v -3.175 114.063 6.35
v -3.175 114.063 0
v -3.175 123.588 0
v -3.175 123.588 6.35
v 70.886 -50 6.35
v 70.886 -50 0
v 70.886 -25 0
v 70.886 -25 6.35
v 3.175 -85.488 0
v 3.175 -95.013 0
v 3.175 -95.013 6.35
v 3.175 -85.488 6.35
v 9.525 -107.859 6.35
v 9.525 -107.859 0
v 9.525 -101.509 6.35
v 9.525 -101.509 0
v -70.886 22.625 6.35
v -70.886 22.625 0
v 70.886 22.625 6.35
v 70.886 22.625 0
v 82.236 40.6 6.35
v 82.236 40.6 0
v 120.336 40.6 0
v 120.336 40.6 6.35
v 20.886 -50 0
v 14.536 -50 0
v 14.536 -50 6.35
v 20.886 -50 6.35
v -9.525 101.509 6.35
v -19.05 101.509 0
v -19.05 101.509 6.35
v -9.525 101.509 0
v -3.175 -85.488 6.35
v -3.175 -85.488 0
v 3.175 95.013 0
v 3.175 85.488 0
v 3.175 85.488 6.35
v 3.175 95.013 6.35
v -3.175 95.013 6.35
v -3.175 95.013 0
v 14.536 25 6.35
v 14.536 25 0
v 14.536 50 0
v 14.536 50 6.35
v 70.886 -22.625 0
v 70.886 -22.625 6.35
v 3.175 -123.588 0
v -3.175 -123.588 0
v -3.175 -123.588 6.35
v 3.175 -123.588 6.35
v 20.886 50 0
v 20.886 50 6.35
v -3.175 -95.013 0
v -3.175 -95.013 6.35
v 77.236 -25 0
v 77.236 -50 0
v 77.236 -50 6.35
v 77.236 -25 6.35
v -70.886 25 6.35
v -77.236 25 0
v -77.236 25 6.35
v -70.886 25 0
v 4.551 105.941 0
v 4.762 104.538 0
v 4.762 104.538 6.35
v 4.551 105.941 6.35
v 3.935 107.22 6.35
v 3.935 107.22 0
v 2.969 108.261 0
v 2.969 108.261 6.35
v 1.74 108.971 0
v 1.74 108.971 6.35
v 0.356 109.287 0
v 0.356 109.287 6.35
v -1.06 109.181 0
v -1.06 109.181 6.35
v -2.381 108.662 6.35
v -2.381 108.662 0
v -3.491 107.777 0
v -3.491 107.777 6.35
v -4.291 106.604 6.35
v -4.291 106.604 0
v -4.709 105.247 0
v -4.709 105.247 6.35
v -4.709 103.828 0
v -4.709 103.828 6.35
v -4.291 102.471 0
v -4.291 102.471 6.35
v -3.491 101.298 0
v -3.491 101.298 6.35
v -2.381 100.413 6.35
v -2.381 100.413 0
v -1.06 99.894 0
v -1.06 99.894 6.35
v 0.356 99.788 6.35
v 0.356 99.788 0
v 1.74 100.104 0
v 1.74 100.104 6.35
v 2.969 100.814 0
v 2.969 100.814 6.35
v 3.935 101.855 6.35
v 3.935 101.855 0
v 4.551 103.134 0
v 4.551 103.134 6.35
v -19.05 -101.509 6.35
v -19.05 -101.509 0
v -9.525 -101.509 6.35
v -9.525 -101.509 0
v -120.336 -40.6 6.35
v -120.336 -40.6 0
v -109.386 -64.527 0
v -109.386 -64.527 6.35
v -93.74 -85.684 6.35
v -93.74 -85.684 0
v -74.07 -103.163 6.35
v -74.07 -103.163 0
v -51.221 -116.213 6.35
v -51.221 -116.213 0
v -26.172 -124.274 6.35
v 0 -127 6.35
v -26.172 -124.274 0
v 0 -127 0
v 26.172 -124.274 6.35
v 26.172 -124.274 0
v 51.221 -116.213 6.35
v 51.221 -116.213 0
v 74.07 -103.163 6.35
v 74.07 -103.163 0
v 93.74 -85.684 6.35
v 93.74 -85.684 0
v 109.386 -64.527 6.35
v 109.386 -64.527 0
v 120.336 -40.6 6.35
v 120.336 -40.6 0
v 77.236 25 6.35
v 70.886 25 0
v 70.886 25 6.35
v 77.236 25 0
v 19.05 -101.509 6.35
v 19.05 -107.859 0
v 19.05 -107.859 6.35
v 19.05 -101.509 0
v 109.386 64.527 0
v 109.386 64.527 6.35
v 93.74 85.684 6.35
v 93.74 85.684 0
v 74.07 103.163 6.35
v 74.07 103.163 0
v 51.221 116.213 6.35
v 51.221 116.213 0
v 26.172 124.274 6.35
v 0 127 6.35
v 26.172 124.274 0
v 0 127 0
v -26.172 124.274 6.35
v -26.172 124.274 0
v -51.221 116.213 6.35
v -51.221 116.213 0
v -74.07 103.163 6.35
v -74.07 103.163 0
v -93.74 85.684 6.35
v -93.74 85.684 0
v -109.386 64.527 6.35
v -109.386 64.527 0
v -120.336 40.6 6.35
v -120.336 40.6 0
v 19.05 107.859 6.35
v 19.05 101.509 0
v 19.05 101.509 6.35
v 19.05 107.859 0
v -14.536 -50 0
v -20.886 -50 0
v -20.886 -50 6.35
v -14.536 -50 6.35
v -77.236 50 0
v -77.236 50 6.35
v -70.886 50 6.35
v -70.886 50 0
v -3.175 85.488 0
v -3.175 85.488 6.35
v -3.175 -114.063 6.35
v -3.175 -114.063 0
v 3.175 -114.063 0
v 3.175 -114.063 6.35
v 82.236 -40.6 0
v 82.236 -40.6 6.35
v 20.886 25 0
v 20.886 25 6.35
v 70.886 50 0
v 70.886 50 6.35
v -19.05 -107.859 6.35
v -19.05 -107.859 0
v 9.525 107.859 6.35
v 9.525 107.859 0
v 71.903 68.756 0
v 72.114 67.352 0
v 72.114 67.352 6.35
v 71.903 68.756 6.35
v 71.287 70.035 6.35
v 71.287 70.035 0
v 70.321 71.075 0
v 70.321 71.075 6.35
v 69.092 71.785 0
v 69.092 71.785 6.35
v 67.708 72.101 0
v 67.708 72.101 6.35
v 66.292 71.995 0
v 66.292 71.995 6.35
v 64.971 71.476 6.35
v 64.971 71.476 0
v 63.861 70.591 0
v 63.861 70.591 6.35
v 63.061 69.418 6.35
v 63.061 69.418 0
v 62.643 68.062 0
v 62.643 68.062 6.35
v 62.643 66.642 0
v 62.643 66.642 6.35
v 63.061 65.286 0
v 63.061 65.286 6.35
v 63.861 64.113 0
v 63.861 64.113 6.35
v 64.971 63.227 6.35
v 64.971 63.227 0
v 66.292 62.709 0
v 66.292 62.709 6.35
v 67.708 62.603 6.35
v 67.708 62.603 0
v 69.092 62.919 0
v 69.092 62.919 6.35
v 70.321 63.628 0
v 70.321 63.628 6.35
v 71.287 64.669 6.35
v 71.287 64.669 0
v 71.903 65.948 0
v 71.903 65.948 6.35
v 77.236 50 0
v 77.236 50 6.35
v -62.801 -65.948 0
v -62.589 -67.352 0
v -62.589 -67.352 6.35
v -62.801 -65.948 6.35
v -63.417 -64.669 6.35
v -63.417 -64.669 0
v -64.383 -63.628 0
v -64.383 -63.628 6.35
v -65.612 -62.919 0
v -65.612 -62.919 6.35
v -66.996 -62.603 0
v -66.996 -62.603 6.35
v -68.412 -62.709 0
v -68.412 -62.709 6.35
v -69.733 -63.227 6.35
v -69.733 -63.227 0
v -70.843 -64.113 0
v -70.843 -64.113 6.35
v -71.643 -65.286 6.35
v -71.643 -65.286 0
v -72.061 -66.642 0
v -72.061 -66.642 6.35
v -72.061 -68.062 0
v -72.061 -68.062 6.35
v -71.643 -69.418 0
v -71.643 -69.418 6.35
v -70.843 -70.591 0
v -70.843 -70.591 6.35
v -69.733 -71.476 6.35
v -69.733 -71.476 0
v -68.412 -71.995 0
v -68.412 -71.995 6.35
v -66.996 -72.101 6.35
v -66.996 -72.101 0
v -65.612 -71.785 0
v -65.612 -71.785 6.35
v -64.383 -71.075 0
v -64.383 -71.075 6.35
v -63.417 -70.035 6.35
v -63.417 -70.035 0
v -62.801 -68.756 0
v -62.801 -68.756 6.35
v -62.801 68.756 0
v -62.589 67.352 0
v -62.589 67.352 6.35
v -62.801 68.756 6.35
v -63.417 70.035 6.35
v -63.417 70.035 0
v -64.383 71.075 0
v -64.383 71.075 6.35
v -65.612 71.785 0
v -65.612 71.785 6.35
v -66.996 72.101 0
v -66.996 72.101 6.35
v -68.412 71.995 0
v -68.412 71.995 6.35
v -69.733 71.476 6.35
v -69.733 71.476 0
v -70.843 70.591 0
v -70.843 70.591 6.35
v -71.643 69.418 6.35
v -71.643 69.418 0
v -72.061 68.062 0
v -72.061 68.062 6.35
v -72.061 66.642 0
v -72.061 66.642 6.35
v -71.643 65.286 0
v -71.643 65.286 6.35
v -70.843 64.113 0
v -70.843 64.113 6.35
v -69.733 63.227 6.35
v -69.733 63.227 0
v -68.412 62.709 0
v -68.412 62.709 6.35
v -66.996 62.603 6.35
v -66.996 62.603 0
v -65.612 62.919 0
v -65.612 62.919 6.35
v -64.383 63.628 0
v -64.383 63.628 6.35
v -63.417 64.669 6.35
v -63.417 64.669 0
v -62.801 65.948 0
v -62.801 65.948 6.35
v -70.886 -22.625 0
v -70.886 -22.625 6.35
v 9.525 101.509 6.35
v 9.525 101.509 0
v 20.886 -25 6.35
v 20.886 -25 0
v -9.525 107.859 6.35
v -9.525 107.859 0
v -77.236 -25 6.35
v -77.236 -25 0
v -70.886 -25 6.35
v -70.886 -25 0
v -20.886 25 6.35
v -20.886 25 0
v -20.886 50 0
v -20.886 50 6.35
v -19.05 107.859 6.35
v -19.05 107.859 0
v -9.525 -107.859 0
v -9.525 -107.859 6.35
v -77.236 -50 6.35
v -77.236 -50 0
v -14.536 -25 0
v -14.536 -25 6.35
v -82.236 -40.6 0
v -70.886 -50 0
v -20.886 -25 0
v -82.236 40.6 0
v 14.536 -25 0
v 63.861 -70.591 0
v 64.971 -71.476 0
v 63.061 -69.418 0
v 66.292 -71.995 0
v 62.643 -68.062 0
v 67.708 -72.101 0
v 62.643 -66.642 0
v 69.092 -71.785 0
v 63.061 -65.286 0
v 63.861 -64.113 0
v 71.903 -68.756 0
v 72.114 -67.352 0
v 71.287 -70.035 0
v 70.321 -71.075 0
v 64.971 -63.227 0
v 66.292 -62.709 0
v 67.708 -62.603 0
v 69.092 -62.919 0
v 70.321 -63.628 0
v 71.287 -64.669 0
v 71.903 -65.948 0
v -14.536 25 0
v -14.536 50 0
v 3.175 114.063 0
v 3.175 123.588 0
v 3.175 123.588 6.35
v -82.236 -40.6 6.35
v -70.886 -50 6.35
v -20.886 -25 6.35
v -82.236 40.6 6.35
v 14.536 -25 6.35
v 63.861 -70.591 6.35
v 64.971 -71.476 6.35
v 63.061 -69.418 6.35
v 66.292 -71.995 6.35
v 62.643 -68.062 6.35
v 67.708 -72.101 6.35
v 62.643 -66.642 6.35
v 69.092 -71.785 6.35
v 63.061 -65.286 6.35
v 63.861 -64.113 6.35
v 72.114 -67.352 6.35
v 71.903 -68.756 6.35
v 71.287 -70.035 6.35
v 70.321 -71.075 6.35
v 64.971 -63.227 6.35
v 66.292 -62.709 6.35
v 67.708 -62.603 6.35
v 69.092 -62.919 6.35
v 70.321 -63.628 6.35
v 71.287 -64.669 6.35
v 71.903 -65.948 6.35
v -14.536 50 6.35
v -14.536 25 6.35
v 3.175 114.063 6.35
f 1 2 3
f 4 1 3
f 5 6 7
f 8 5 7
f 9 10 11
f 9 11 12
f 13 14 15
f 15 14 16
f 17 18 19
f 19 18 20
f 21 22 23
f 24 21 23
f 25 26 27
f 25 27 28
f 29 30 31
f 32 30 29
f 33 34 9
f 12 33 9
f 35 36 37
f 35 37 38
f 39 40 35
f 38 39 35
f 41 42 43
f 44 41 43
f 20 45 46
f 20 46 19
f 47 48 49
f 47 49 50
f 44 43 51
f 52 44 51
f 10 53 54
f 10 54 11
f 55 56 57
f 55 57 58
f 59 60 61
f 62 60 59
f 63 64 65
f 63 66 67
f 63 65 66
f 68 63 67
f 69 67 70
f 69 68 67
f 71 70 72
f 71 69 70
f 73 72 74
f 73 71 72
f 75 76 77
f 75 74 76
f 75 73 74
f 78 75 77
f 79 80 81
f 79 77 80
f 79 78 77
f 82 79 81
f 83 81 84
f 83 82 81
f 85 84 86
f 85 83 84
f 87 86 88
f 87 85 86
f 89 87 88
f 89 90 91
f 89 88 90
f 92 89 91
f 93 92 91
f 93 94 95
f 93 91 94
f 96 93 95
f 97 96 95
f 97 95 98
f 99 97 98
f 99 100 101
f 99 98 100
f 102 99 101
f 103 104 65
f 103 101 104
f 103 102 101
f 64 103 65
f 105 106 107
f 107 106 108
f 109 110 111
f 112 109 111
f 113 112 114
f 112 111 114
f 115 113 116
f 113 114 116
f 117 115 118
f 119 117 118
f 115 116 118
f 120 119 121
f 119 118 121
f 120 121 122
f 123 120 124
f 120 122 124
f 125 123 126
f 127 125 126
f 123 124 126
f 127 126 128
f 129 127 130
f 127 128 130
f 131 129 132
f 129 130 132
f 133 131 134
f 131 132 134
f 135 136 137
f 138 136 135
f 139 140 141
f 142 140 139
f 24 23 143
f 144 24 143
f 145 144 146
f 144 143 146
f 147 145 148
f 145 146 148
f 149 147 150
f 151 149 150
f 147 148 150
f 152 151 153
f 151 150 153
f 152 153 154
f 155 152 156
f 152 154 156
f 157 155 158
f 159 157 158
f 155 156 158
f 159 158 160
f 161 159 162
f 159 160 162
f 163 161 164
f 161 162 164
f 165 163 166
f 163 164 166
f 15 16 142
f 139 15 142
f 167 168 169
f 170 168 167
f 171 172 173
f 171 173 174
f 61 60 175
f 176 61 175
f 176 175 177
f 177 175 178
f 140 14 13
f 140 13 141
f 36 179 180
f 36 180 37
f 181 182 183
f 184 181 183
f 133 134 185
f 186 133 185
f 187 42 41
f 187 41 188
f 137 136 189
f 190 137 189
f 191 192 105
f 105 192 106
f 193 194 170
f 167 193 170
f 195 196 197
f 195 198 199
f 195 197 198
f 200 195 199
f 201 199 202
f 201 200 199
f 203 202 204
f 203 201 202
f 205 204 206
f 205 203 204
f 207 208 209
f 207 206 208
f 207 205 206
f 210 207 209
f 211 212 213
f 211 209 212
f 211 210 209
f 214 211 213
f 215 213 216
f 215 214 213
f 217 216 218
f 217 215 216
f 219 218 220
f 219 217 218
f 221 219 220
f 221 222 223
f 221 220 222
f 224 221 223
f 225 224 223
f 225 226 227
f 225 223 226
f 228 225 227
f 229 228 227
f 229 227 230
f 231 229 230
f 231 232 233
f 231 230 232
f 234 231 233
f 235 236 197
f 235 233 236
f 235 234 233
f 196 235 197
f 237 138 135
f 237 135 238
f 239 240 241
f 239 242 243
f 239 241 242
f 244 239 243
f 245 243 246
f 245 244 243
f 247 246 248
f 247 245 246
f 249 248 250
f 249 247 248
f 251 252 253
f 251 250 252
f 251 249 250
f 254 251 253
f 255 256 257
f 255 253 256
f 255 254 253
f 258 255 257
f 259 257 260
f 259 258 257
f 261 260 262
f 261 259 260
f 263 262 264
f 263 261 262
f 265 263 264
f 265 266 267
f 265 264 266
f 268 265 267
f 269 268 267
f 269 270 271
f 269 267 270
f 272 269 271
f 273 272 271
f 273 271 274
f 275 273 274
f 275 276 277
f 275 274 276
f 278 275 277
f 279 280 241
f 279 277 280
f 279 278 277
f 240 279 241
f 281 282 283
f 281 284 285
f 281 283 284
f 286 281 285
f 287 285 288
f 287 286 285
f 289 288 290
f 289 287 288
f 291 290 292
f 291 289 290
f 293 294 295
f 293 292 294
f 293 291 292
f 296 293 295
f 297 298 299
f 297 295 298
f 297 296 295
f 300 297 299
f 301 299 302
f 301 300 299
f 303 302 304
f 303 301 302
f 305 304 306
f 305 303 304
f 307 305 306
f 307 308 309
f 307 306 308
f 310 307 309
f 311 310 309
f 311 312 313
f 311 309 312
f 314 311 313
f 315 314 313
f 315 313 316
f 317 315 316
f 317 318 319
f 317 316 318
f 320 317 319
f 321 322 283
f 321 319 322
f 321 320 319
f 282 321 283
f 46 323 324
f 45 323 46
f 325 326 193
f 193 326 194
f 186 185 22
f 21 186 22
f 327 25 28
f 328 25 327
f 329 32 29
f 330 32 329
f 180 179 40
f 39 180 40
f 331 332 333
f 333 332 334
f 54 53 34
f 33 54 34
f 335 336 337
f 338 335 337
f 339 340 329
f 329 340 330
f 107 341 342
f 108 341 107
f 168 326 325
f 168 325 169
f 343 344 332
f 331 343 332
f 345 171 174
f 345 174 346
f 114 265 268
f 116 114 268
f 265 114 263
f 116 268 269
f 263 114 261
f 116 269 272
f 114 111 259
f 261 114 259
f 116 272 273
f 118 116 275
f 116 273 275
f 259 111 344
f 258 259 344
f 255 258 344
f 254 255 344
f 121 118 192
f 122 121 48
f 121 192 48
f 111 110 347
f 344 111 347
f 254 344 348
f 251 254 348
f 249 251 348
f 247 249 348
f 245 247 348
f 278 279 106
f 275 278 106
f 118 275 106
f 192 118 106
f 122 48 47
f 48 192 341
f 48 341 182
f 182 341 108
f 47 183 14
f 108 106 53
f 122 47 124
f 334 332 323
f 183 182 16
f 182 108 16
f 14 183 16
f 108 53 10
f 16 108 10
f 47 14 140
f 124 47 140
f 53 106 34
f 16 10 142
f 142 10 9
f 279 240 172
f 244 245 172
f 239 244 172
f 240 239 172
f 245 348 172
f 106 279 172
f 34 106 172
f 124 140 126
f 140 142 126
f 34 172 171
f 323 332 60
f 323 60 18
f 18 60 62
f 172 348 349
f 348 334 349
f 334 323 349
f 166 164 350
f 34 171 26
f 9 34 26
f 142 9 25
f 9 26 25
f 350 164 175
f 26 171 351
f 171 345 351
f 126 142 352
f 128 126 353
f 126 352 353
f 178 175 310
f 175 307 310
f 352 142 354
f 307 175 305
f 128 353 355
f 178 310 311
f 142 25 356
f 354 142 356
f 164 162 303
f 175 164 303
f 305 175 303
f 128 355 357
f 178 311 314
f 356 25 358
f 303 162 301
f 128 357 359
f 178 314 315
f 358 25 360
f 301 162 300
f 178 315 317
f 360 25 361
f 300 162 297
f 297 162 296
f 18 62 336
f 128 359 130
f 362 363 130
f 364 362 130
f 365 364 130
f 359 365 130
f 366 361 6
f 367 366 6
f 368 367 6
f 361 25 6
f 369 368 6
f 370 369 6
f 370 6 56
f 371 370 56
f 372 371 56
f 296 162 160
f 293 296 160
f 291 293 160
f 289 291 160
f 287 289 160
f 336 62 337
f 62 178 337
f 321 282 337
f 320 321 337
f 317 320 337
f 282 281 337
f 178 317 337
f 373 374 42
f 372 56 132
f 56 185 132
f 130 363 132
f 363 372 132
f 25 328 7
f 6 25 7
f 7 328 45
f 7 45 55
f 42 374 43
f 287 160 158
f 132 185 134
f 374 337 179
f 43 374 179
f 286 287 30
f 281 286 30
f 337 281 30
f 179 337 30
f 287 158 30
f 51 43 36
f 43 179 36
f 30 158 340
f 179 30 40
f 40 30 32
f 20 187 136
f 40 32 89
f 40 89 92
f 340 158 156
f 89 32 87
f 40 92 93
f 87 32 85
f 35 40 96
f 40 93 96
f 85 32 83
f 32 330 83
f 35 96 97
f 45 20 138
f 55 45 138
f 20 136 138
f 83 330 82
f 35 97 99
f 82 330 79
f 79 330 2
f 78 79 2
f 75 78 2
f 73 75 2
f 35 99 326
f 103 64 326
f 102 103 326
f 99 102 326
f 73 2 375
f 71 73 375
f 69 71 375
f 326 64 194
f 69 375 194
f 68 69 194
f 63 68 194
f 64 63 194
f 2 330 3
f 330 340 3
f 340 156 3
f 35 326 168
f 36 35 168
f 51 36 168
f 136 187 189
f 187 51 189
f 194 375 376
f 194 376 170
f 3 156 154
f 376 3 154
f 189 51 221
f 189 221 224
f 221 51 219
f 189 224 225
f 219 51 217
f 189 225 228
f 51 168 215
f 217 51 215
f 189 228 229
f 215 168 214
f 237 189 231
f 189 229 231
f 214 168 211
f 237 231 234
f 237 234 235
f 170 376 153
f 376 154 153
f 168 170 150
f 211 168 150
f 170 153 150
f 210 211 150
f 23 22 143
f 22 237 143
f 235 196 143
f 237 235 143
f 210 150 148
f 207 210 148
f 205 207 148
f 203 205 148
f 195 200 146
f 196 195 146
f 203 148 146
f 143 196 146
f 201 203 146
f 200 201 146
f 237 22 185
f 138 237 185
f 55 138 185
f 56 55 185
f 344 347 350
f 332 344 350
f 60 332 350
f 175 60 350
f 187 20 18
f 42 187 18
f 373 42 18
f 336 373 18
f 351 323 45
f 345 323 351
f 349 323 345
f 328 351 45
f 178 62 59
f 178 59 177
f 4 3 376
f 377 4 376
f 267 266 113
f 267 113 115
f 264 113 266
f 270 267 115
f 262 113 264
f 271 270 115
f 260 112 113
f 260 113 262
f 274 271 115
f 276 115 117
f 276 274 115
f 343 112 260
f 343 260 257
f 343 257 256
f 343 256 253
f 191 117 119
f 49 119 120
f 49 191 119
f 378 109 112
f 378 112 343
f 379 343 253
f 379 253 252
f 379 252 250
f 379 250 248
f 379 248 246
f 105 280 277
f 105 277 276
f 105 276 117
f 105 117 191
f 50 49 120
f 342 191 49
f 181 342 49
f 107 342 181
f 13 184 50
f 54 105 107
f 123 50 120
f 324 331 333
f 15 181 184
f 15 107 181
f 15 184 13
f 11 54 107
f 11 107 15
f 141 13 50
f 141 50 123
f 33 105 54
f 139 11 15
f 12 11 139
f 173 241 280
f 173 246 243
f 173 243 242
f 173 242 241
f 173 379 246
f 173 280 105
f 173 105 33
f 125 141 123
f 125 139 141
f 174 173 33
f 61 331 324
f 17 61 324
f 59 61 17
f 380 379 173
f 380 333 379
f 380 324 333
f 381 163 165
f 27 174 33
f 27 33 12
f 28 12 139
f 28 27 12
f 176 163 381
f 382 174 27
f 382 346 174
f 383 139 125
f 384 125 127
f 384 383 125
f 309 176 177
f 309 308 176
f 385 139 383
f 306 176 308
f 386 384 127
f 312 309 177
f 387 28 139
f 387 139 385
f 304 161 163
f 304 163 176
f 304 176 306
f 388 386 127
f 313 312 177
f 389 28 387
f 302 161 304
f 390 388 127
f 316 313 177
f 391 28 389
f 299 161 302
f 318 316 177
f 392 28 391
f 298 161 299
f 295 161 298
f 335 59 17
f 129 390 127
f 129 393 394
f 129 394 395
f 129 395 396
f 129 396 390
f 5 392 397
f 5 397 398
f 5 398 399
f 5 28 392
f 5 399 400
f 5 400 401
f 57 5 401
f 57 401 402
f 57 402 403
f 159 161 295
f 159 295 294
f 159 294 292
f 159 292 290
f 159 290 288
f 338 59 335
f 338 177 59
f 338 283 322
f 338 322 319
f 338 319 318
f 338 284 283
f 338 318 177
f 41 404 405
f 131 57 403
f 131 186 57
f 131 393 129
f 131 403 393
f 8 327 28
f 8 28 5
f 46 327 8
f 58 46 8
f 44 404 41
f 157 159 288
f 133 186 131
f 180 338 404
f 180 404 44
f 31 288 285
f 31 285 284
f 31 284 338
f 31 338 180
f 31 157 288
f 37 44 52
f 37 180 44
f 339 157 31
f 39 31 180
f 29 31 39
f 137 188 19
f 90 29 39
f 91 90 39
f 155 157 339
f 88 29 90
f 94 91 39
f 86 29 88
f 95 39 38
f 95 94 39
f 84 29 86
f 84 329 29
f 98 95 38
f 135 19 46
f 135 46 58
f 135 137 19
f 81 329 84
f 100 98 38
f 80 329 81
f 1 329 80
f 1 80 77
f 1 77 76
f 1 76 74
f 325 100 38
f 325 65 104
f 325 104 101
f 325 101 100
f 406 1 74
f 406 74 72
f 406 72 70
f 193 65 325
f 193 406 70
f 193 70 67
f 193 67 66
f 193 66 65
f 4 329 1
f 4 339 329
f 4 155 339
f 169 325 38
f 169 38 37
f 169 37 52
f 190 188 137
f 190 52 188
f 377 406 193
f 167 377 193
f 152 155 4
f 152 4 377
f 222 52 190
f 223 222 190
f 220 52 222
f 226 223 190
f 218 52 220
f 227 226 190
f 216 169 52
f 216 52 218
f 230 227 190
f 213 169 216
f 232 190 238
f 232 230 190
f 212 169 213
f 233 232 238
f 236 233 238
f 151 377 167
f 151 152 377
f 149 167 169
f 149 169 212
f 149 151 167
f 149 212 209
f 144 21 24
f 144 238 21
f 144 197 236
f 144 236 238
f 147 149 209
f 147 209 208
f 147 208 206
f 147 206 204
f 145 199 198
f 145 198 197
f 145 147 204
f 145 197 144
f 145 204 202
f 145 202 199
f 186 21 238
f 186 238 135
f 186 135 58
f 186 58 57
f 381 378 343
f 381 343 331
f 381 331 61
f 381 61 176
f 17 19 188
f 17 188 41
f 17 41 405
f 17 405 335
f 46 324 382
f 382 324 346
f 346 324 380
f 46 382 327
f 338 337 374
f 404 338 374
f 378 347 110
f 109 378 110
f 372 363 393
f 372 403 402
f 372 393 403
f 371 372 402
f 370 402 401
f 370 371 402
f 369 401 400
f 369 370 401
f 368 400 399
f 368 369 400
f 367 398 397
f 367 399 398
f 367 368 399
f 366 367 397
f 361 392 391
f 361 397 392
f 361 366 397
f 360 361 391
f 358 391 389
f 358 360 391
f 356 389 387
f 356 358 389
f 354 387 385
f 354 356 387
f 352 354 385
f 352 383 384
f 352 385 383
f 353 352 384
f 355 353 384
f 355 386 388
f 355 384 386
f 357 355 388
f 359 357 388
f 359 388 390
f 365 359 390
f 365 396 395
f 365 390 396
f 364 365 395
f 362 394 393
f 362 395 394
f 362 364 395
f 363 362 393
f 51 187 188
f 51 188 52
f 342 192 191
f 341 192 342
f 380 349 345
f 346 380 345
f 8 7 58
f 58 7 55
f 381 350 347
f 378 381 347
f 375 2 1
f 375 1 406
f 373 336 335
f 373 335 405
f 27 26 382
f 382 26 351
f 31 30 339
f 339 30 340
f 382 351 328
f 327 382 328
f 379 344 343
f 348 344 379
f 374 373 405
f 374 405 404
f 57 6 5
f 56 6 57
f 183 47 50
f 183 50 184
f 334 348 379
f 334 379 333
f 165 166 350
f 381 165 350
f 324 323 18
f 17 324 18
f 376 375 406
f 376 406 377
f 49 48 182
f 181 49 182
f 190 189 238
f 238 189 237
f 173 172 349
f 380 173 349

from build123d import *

# Parameters (mm, degrees)
BOSS_EXTRUDE1_DEPTH     = 6.35
CUT_EXTRUDE1_DEPTH      = 176.071306912
CUT_EXTRUDE1_DEPTH_BACK = 176.071306912
SKETCH2_W               = 6.35
SKETCH2_H               = 24.999999975
SKETCH2_H_2             = 24.999999974
CUT_EXTRUDE2_DEPTH      = 176.071306912
CUT_EXTRUDE2_DEPTH_BACK = 176.071306912
SKETCH5_W               = 141.771062044
SKETCH5_H               = 45.249999988
CUT_EXTRUDE3_DEPTH      = 176.071306912
CUT_EXTRUDE3_DEPTH_BACK = 176.071306912
SKETCH6_R               = 4.7625
CUT_EXTRUDE4_DEPTH      = 176.071306912
CUT_EXTRUDE4_DEPTH_BACK = 176.071306912
SKETCH7_R               = 4.7625
CUT_EXTRUDE5_DEPTH      = 176.071306912
CUT_EXTRUDE5_DEPTH_BACK = 176.071306912
SKETCH8_W               = 6.35
SKETCH8_H               = 9.525
SKETCH8_W_2             = 9.525
SKETCH8_H_2             = 6.35


with BuildPart() as part:
    # Sketch1 → Boss-Extrude1 (new body)
    with BuildSketch(Plane.XY):
        with BuildLine():
            Line((120.335530928, -40.599999953), (82.235530928, -40.599999953))
            Line((82.235530928, -40.599999953), (82.235530928, 40.599999953))
            Line((82.235530928, 40.599999953), (120.335530928, 40.599999953))
            ThreePointArc((120.335530928, 40.599999953), (0, 127), (-120.335530928, 40.599999953))
            Line((-120.335530928, 40.599999953), (-82.235530928, 40.599999953))
            Line((-82.235530928, 40.599999953), (-82.235530928, -40.599999953))
            Line((-82.235530928, -40.599999953), (-120.335530928, -40.599999953))
            ThreePointArc((-120.335530928, -40.599999953), (0, -127), (120.335530928, -40.599999953))
        make_face()
    extrude(amount=BOSS_EXTRUDE1_DEPTH)

    # Sketch2 → Cut-Extrude1 (cut, two sides: drawn at the far end of the back side and taken through both)
    with BuildSketch(Plane.XY.offset(6.35).offset(-CUT_EXTRUDE1_DEPTH_BACK)):
        with Locations((17.710530946, 37.499999962)):
            Rectangle(SKETCH2_W, SKETCH2_H)
        with Locations((-74.060531022, 37.499999962)):
            Rectangle(SKETCH2_W, SKETCH2_H)
        with Locations((-17.710530946, 37.499999962)):
            Rectangle(SKETCH2_W, SKETCH2_H)
        with Locations((74.060531022, 37.499999962)):
            Rectangle(SKETCH2_W, SKETCH2_H_2)
        with Locations((74.060531022, -37.499999962)):
            Rectangle(SKETCH2_W, SKETCH2_H_2)
        with Locations((17.710530946, -37.499999962)):
            Rectangle(SKETCH2_W, SKETCH2_H)
        with Locations((-17.710530946, -37.499999962)):
            Rectangle(SKETCH2_W, SKETCH2_H_2)
        with Locations((-74.060531022, -37.499999962)):
            Rectangle(SKETCH2_W, SKETCH2_H_2)
    extrude(amount=CUT_EXTRUDE1_DEPTH + CUT_EXTRUDE1_DEPTH_BACK, mode=Mode.SUBTRACT)

    # Sketch5 → Cut-Extrude2 (cut, two sides: drawn at the far end of the back side and taken through both)
    with BuildSketch(Plane.XY.offset(6.35).offset(-CUT_EXTRUDE2_DEPTH_BACK)):
        Rectangle(SKETCH5_W, SKETCH5_H)
    extrude(amount=CUT_EXTRUDE2_DEPTH + CUT_EXTRUDE2_DEPTH_BACK, mode=Mode.SUBTRACT)

    # Sketch6 → Cut-Extrude3 (cut, two sides: drawn at the far end of the back side and taken through both)
    with BuildSketch(Plane.XY.offset(6.35).offset(-CUT_EXTRUDE3_DEPTH_BACK)):
        with Locations((-67.351920908, 67.351920908)):
            Circle(SKETCH6_R)
        with Locations((67.351920908, 67.351920908)):
            Circle(SKETCH6_R)
        with Locations((67.351920908, -67.351920908)):
            Circle(SKETCH6_R)
        with Locations((-67.351920908, -67.351920908)):
            Circle(SKETCH6_R)
    extrude(amount=CUT_EXTRUDE3_DEPTH + CUT_EXTRUDE3_DEPTH_BACK, mode=Mode.SUBTRACT)

    # Sketch7 → Cut-Extrude4 (cut, two sides: drawn at the far end of the back side and taken through both)
    with BuildSketch(Plane.XY.offset(6.35).offset(-CUT_EXTRUDE4_DEPTH_BACK)):
        with Locations((0, 104.537500094)):
            Circle(SKETCH7_R)
    extrude(amount=CUT_EXTRUDE4_DEPTH + CUT_EXTRUDE4_DEPTH_BACK, mode=Mode.SUBTRACT)

    # Sketch8 → Cut-Extrude5 (cut, two sides: drawn at the far end of the back side and taken through both)
    with BuildSketch(Plane.XY.offset(6.35).offset(-CUT_EXTRUDE5_DEPTH_BACK)):
        with Locations((0, 118.825000094)):
            Rectangle(SKETCH8_W, SKETCH8_H)
        with Locations((0, 90.250000094)):
            Rectangle(SKETCH8_W, SKETCH8_H)
        with Locations((0, -90.250000094)):
            Rectangle(SKETCH8_W, SKETCH8_H)
        with Locations((0, -118.825000094)):
            Rectangle(SKETCH8_W, SKETCH8_H)
        with Locations((-14.2875, 104.683652736)):
            Rectangle(SKETCH8_W_2, SKETCH8_H_2)
        with Locations((14.2875, 104.683652736)):
            Rectangle(SKETCH8_W_2, SKETCH8_H_2)
        with Locations((14.2875, -104.683652736)):
            Rectangle(SKETCH8_W_2, SKETCH8_H_2)
        with Locations((-14.2875, -104.683652736)):
            Rectangle(SKETCH8_W_2, SKETCH8_H_2)
    extrude(amount=CUT_EXTRUDE5_DEPTH + CUT_EXTRUDE5_DEPTH_BACK, mode=Mode.SUBTRACT)


solid = part.part
